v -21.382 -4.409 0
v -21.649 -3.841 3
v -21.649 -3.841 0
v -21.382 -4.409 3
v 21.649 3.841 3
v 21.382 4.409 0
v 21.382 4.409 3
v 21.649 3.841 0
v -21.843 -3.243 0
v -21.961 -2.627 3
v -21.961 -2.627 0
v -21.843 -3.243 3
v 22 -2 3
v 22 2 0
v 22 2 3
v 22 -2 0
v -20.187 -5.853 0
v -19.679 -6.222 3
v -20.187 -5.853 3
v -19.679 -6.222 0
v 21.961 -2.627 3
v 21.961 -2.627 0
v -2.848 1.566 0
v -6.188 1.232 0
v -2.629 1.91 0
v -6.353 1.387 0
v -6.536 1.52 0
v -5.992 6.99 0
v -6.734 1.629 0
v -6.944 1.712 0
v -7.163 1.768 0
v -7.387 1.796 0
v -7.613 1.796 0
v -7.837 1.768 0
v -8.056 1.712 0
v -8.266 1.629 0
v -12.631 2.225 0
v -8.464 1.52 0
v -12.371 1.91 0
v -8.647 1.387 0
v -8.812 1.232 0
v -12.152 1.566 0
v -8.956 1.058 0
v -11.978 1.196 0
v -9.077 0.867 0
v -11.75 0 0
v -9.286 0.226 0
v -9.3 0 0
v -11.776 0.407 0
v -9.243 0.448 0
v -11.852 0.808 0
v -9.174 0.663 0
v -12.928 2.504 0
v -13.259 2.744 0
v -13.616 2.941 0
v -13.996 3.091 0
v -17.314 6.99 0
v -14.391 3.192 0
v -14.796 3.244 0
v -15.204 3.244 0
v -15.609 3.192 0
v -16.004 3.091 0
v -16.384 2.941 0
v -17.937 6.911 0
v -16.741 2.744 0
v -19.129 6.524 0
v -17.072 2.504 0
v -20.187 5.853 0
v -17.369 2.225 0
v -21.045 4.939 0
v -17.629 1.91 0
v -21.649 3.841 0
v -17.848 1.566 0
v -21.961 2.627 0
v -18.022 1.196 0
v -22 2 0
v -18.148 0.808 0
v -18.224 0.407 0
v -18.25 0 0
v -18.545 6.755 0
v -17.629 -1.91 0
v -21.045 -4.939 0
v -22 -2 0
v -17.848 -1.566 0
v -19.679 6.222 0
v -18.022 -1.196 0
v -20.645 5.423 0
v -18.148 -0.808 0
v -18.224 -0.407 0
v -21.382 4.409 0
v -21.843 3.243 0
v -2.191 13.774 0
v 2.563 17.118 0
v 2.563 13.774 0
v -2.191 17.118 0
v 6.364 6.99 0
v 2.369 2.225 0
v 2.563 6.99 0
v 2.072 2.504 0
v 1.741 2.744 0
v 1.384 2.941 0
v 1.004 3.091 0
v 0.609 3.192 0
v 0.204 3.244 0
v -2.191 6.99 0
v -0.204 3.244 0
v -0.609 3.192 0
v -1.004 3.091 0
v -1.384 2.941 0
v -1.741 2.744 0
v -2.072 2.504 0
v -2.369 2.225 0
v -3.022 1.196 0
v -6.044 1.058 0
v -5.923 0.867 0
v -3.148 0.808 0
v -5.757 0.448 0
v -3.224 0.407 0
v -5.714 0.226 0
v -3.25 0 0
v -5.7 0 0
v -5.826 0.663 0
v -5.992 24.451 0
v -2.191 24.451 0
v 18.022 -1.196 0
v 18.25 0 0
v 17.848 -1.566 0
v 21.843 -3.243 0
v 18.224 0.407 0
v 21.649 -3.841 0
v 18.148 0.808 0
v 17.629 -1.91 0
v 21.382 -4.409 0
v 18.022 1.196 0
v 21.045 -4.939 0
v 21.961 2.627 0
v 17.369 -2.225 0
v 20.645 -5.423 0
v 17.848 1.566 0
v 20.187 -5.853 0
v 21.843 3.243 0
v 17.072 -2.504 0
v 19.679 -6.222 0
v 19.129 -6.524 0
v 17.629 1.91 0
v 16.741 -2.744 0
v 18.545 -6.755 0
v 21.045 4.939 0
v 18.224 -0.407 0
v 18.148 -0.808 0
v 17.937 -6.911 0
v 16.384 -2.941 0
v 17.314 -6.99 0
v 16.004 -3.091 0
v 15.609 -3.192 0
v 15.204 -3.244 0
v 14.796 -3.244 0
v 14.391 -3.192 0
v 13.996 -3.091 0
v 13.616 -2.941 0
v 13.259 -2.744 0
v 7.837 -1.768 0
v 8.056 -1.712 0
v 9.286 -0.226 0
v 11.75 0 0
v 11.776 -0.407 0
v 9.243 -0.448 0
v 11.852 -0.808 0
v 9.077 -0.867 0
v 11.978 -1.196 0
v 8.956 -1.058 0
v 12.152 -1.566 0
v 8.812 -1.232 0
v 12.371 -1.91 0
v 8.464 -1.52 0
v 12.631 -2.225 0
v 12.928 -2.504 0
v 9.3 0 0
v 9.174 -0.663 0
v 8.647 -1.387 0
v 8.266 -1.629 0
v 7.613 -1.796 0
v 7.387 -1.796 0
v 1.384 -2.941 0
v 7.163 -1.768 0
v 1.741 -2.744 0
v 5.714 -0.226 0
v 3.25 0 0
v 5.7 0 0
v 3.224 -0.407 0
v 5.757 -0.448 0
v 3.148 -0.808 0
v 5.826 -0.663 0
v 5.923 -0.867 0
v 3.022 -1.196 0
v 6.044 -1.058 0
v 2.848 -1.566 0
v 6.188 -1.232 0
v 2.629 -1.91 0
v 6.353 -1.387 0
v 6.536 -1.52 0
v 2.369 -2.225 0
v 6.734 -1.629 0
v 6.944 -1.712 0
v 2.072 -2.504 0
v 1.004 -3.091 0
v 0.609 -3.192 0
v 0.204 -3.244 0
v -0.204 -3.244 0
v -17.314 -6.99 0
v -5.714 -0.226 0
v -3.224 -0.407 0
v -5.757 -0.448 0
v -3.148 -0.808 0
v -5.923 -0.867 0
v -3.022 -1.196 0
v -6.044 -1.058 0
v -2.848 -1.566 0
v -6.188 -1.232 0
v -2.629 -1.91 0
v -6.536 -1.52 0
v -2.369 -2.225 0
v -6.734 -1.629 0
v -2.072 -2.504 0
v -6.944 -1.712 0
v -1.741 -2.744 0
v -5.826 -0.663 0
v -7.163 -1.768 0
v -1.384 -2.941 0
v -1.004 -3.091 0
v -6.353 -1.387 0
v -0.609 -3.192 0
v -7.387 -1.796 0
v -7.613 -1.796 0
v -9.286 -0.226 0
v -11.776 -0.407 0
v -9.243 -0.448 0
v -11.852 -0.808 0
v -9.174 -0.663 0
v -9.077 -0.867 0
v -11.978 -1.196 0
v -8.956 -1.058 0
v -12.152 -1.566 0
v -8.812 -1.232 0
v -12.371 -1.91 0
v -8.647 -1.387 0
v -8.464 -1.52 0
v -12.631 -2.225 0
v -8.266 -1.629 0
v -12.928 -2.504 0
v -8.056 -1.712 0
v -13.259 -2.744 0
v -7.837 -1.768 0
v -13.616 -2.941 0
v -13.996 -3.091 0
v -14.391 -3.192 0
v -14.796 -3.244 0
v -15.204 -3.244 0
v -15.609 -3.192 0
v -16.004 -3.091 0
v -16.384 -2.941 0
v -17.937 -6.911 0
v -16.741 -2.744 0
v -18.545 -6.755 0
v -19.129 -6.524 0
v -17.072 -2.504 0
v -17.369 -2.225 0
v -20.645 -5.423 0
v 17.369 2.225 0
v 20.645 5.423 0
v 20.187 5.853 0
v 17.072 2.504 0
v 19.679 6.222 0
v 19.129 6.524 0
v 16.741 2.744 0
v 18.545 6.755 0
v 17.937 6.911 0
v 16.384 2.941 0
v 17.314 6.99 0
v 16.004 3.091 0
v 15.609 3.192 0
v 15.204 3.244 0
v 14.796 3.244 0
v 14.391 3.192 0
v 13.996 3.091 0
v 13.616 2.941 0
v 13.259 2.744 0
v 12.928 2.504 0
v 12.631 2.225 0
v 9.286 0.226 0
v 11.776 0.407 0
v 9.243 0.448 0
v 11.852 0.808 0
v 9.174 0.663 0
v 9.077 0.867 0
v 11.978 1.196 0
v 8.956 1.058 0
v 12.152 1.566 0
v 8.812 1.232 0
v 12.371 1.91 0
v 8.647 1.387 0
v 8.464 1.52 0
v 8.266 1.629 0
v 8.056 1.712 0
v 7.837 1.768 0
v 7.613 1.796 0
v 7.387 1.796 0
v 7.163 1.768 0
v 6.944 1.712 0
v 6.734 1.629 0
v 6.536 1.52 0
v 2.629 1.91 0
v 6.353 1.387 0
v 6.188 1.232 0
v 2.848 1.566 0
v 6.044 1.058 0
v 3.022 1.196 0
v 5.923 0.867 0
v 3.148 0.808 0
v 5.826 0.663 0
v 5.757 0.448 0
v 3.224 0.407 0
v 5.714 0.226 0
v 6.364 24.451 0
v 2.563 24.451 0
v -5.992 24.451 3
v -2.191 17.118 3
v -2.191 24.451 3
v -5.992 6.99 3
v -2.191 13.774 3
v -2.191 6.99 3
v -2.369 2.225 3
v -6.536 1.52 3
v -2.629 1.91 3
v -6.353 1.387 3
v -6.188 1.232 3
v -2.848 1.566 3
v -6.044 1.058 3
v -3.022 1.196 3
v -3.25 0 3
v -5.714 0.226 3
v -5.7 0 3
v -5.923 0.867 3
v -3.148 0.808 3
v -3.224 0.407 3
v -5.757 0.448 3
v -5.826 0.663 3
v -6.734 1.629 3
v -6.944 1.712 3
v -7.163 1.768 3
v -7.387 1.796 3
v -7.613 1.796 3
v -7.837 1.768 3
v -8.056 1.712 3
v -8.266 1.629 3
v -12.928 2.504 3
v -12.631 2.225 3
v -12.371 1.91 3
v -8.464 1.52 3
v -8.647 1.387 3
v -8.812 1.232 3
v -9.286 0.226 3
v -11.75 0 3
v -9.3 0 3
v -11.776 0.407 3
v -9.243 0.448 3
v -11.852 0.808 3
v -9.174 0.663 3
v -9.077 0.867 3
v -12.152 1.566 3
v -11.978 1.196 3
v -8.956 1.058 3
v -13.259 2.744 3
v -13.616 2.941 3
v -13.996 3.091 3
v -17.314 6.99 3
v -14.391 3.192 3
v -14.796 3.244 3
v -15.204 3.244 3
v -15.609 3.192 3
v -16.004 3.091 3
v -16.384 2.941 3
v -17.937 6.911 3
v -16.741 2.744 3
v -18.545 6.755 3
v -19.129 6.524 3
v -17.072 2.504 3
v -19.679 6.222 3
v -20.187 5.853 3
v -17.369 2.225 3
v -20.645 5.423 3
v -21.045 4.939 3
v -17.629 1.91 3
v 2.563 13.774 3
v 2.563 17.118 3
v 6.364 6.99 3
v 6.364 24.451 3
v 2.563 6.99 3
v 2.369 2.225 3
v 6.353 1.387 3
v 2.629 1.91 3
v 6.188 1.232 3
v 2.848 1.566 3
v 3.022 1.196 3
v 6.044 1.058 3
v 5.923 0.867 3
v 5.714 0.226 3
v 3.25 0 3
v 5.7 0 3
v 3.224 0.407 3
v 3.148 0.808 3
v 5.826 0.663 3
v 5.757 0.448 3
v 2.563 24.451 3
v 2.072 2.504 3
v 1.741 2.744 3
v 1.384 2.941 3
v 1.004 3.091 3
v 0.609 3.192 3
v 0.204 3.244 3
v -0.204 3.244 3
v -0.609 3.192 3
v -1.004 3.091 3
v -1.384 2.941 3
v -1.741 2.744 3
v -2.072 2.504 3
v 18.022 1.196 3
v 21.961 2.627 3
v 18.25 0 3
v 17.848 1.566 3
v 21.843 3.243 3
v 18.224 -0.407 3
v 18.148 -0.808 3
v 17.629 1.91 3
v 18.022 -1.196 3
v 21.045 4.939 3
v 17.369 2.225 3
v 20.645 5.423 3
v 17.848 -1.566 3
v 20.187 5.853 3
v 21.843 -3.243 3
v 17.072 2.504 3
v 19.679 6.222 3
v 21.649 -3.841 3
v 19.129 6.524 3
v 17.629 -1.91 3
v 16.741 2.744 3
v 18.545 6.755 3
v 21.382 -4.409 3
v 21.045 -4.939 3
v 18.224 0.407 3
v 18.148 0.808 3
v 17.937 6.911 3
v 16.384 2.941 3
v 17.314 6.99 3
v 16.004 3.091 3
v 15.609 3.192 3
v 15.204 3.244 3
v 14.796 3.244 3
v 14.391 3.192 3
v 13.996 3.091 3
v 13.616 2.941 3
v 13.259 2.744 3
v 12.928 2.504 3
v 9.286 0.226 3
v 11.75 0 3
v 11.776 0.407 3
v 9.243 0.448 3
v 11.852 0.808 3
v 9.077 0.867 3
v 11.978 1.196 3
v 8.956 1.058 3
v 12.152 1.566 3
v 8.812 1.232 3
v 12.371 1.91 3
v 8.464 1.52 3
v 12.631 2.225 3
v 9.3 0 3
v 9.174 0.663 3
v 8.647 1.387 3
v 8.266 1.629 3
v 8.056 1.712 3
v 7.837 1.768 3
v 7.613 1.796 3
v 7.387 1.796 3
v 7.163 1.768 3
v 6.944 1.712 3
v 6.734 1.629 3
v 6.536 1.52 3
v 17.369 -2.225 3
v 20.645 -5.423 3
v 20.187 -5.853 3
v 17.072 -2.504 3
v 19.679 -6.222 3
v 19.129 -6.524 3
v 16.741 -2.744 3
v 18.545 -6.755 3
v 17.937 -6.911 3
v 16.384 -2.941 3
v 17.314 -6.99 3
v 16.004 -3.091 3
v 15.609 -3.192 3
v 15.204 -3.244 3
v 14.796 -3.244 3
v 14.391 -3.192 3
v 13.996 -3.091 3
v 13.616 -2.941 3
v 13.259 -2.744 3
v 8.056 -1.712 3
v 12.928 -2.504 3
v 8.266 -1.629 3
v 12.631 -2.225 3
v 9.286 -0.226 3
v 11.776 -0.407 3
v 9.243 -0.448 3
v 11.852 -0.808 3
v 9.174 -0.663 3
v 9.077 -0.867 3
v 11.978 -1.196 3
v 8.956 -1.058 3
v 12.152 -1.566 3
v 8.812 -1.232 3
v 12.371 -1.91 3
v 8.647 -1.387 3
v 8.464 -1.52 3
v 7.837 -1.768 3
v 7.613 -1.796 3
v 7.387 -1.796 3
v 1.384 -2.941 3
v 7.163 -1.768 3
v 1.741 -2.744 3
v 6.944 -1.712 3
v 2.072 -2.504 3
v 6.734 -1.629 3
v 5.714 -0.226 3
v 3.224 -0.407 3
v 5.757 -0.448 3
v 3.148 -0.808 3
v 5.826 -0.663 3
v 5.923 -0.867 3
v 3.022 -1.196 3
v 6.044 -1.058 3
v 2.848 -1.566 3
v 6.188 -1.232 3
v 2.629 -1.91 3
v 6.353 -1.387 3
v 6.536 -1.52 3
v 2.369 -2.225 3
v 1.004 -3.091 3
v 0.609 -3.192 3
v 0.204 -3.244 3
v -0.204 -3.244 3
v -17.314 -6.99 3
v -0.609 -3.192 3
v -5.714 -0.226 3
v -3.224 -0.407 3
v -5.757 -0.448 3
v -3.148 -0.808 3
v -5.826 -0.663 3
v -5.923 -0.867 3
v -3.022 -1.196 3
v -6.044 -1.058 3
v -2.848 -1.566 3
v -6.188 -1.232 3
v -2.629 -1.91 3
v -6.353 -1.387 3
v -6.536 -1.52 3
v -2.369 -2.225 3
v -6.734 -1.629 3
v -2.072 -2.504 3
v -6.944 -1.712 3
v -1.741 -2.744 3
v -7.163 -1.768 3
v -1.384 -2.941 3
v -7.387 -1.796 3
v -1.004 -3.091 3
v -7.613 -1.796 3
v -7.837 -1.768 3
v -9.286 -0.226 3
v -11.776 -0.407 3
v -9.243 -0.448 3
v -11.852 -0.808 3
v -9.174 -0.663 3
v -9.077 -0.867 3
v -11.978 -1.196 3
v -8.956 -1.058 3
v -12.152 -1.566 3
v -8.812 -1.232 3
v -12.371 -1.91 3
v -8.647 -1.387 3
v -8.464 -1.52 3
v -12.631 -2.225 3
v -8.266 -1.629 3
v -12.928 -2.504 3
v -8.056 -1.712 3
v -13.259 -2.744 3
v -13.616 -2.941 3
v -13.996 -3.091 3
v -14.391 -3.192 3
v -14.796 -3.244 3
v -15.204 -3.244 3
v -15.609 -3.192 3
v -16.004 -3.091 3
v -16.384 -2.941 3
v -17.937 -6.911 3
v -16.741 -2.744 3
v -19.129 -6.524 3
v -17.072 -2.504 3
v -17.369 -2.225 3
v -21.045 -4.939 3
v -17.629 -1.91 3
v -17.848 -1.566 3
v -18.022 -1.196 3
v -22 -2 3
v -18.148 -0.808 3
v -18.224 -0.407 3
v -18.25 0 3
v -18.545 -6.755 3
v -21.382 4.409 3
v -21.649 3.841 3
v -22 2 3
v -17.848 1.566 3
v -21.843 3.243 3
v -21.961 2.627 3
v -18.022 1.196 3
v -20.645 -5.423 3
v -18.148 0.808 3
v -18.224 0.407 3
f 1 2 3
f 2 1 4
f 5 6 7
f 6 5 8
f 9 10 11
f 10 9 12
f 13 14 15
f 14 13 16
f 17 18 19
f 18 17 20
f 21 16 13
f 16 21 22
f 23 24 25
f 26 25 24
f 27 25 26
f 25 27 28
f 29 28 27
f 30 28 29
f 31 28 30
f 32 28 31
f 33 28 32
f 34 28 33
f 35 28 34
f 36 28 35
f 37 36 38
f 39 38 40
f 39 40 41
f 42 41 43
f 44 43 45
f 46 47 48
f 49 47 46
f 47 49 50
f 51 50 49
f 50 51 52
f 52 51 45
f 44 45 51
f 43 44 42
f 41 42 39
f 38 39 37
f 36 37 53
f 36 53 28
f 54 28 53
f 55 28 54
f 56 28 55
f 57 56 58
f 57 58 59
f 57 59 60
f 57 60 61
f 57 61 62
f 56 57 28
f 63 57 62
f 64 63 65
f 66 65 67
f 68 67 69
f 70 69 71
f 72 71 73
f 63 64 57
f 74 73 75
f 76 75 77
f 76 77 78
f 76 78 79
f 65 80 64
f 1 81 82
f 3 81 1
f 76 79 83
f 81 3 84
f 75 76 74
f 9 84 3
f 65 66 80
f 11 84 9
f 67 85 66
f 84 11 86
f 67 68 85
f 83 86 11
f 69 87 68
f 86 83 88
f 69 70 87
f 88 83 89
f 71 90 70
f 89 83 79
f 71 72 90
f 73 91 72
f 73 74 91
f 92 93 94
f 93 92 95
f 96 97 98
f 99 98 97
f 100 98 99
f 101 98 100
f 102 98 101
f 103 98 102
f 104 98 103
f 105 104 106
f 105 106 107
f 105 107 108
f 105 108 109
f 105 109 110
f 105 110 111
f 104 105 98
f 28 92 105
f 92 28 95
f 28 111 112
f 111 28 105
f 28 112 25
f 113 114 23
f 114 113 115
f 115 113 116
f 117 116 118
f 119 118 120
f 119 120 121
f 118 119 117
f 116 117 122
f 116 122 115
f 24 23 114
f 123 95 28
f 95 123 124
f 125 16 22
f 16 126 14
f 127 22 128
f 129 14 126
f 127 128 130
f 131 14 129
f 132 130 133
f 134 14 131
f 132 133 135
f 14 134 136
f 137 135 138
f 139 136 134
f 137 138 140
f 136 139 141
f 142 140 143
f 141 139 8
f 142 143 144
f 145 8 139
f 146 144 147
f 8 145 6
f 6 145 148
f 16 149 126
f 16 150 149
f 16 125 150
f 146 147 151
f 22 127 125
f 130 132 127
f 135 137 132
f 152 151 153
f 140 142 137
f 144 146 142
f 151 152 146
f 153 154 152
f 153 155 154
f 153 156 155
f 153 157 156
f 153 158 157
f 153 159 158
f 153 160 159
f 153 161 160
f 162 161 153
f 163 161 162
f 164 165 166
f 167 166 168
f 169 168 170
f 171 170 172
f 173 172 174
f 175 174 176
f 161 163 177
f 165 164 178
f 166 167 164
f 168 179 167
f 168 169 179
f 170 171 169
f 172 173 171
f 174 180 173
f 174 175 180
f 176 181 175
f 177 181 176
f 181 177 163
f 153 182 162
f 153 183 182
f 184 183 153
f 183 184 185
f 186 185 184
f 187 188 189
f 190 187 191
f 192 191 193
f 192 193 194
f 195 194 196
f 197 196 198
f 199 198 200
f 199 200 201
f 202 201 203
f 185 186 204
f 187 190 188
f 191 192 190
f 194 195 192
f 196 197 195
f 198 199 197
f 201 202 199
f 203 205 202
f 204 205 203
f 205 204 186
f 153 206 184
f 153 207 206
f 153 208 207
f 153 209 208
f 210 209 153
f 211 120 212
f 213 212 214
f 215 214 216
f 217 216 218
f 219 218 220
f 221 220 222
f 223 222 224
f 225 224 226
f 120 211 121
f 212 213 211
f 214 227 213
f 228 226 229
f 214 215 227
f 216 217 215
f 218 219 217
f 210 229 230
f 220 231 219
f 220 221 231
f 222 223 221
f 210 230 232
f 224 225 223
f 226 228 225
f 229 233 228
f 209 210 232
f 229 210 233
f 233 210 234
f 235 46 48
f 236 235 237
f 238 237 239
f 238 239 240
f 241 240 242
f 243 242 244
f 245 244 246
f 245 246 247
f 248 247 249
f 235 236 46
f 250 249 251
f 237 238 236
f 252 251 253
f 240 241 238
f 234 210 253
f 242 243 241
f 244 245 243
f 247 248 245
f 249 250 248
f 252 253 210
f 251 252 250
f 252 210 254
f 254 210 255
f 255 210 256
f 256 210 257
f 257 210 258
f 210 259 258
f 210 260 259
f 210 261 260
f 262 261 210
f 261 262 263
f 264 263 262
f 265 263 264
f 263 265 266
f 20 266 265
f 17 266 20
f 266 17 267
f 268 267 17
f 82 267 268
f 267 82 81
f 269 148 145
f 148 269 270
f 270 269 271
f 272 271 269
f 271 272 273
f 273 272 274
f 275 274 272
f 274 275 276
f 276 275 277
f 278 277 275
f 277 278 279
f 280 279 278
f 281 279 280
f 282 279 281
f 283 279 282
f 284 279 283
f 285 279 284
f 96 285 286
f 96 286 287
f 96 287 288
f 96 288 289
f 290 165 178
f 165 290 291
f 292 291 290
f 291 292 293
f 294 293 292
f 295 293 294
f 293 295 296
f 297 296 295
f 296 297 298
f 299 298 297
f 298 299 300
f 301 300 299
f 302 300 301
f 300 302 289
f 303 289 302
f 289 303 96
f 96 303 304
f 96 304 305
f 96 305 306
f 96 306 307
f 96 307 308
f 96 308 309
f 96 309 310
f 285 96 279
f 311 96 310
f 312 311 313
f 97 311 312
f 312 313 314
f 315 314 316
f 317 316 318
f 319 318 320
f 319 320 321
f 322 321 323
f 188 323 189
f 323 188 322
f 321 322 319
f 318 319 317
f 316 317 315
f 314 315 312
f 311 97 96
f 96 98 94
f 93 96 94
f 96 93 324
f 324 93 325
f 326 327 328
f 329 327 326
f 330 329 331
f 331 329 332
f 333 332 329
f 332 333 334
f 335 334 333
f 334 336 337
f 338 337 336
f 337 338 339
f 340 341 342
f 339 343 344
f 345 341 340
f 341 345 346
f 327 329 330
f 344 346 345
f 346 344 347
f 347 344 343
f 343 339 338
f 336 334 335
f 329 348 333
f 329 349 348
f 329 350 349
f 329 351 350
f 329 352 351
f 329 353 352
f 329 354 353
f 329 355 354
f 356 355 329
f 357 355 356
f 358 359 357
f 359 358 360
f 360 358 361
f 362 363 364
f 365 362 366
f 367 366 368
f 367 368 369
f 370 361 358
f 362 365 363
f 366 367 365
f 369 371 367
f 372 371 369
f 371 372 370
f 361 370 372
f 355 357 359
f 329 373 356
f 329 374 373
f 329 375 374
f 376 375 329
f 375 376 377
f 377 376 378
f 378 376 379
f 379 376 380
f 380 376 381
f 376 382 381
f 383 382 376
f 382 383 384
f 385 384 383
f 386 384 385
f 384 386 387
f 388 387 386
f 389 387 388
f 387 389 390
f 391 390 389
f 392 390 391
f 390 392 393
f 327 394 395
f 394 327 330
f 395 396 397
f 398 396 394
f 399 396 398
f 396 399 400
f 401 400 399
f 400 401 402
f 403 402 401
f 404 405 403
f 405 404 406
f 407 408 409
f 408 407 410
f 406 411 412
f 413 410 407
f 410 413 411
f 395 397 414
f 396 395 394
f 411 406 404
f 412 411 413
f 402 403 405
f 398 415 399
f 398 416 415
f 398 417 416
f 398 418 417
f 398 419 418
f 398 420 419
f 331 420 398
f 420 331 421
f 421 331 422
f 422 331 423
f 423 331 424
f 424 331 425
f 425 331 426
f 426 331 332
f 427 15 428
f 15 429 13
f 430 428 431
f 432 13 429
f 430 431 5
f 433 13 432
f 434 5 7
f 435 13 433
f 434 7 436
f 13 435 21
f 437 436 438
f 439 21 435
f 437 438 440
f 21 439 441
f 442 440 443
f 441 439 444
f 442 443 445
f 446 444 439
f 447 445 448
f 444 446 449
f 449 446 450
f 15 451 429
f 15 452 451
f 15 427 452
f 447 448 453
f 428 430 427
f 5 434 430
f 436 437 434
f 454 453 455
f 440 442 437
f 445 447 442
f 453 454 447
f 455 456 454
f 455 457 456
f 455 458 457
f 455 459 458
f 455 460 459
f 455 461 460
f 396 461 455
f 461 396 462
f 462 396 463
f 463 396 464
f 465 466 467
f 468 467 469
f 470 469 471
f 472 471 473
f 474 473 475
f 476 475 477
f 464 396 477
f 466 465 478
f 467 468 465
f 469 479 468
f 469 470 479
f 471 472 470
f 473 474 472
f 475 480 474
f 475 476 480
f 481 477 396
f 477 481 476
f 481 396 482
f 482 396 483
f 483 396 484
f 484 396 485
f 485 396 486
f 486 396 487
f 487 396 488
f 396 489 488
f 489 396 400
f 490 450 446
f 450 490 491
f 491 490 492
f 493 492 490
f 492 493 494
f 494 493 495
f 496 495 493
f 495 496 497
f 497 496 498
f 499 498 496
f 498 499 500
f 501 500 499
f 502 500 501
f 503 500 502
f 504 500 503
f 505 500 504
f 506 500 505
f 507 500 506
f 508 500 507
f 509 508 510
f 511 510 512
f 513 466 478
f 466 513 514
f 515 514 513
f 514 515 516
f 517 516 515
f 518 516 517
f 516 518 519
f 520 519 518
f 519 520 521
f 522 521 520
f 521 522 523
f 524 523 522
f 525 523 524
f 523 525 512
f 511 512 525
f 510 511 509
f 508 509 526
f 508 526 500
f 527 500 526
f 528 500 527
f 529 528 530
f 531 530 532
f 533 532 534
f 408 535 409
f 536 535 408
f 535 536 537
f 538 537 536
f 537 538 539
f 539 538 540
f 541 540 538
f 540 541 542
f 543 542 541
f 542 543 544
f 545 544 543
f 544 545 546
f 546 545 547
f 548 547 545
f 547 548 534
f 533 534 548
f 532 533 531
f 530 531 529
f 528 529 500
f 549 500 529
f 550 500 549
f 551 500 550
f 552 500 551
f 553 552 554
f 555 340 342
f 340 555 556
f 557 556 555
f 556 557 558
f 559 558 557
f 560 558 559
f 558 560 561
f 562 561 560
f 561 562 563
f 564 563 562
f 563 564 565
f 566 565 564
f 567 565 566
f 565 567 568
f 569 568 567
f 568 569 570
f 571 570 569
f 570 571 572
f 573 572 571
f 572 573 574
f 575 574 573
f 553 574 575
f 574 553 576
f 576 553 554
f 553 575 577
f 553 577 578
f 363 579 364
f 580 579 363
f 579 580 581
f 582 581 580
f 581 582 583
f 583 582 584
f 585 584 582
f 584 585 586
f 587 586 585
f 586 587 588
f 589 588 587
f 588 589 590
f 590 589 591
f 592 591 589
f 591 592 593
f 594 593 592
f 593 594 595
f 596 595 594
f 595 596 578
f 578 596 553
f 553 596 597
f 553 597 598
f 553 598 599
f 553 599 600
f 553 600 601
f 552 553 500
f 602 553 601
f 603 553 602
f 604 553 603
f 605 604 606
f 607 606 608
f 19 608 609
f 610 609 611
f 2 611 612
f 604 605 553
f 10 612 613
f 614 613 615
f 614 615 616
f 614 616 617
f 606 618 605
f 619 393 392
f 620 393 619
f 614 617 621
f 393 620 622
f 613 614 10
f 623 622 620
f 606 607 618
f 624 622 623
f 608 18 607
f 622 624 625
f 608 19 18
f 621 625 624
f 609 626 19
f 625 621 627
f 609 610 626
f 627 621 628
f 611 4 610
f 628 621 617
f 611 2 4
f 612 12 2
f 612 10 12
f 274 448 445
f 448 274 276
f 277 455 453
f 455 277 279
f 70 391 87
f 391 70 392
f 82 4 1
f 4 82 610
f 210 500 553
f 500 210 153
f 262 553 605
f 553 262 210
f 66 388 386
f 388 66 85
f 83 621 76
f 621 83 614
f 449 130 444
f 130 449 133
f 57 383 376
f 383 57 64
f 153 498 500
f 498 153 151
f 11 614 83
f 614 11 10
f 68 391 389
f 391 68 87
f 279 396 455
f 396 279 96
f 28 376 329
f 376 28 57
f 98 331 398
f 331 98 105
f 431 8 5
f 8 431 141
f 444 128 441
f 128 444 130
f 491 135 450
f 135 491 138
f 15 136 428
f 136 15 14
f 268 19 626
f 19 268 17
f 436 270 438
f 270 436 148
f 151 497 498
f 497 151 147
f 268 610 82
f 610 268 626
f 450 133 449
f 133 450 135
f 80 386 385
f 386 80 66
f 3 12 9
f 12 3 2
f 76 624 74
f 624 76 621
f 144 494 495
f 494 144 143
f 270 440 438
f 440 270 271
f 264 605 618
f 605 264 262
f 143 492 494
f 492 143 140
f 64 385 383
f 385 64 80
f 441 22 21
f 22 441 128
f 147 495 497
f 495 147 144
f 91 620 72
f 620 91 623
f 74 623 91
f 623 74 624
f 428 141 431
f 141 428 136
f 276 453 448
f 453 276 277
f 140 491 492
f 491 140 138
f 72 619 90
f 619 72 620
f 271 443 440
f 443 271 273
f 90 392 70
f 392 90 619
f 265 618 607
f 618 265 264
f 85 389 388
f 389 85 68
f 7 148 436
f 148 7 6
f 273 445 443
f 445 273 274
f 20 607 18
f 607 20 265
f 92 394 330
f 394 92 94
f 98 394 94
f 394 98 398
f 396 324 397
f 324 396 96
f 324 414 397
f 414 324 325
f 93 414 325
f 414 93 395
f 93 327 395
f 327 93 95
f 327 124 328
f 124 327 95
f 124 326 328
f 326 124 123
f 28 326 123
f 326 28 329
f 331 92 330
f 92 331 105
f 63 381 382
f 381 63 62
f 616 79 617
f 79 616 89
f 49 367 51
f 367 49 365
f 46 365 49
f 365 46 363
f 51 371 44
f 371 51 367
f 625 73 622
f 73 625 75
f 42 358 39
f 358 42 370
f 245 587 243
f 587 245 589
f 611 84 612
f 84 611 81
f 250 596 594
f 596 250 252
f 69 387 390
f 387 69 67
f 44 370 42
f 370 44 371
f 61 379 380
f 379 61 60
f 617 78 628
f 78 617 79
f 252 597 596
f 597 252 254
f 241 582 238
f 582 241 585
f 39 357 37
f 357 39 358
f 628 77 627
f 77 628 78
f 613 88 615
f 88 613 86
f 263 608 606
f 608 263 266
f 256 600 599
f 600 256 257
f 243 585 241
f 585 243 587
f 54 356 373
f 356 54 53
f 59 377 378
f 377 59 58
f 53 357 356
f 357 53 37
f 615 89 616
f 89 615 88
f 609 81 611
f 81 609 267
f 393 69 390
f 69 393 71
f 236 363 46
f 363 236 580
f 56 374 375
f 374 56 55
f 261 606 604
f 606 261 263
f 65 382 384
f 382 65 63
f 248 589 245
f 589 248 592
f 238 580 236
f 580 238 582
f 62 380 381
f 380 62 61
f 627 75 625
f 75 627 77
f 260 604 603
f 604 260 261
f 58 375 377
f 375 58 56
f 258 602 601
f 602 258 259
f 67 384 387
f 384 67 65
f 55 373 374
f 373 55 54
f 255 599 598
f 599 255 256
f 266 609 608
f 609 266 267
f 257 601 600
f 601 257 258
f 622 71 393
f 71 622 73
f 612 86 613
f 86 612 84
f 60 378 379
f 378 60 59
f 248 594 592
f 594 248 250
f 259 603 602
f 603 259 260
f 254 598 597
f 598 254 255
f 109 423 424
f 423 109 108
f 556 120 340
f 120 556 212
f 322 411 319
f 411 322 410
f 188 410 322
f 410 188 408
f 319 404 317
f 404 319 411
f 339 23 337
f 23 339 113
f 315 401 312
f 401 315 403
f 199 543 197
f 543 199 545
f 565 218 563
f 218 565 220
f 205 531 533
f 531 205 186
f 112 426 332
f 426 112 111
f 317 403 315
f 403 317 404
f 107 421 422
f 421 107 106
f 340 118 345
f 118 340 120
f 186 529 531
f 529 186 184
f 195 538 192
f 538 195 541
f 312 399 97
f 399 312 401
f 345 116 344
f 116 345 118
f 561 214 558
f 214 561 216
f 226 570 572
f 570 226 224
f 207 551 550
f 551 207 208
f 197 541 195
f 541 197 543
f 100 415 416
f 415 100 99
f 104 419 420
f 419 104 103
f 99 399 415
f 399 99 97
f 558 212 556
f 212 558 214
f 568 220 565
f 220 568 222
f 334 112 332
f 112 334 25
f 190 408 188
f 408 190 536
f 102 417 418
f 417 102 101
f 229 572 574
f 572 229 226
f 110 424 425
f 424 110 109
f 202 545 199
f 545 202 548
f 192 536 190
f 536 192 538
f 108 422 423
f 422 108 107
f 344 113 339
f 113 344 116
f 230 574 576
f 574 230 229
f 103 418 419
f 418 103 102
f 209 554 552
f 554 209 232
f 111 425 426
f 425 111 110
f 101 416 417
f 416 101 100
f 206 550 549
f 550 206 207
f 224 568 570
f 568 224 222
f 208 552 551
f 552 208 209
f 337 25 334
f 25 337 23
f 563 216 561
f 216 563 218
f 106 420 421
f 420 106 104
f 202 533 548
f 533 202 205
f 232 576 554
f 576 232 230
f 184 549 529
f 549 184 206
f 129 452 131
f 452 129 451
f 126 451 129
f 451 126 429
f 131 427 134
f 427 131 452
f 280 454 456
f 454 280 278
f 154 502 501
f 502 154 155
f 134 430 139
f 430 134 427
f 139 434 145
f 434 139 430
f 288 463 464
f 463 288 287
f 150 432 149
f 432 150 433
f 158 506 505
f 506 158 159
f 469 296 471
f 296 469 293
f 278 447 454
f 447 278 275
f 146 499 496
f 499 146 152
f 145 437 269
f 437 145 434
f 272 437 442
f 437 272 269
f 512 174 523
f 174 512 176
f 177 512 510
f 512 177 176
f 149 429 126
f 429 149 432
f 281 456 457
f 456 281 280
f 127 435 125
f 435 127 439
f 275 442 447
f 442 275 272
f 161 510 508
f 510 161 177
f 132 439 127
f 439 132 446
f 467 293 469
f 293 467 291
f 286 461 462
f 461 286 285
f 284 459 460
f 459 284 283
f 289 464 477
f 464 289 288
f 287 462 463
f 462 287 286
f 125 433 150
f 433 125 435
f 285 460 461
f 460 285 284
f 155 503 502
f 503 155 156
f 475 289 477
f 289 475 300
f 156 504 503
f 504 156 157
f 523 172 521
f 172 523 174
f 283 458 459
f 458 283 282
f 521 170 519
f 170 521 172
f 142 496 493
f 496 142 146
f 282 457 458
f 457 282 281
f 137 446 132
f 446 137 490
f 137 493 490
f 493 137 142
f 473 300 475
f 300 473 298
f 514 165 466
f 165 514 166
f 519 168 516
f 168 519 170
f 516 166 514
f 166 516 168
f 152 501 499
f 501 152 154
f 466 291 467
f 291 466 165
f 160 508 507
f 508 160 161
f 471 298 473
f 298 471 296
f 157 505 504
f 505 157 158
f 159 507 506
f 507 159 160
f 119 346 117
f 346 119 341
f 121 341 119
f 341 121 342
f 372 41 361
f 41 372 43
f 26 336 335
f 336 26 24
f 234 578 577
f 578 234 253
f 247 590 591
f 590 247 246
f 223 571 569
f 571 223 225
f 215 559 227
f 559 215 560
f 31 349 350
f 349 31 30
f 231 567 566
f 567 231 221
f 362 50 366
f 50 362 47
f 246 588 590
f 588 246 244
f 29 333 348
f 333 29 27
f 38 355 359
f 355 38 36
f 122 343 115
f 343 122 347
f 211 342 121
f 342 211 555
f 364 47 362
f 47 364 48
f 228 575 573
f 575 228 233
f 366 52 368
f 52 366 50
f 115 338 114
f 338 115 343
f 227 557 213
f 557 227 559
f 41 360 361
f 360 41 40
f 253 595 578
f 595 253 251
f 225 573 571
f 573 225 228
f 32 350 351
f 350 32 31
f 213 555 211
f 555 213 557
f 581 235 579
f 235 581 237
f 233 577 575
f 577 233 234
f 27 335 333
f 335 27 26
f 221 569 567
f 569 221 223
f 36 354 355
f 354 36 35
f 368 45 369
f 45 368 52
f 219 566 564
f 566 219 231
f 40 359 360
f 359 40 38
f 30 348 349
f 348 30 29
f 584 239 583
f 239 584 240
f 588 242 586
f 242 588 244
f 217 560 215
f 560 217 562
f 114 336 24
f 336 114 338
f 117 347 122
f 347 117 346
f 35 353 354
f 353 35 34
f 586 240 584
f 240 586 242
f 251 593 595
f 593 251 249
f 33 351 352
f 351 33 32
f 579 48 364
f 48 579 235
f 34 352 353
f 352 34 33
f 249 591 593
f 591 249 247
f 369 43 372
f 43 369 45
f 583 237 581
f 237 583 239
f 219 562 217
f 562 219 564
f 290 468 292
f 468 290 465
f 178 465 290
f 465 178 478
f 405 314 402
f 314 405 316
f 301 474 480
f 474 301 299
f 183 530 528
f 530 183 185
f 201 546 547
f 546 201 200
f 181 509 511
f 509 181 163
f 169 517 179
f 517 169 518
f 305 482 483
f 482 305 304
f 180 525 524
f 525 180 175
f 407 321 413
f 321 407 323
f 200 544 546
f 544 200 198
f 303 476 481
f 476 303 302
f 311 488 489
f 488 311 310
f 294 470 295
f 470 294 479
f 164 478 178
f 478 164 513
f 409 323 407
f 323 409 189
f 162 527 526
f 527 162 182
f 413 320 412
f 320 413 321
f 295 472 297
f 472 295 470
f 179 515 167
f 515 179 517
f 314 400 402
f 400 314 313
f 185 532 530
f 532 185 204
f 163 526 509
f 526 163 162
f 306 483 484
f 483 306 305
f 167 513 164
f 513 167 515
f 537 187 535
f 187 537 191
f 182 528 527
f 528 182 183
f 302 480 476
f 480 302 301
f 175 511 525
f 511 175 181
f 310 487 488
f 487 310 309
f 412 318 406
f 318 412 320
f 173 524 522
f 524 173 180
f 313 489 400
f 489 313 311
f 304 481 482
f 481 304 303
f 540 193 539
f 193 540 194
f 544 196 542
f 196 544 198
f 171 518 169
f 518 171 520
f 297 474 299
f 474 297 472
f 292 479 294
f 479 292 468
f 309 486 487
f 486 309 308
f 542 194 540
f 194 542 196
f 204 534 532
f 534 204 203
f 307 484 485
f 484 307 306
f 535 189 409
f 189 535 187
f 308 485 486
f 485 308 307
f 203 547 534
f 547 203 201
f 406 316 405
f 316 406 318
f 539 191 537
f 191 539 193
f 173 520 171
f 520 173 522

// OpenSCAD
$fn = 50;


difference() {
	union() {
		hull() {
			translate(v = [-17.0000000000, 2.0000000000, 0]) {
				cylinder(h = 3, r = 5);
			}
			translate(v = [17.0000000000, 2.0000000000, 0]) {
				cylinder(h = 3, r = 5);
			}
			translate(v = [-17.0000000000, -2.0000000000, 0]) {
				cylinder(h = 3, r = 5);
			}
			translate(v = [17.0000000000, -2.0000000000, 0]) {
				cylinder(h = 3, r = 5);
			}
		}
		translate(v = [0, 24, 0]) {
			linear_extrude(height = 3) {
				text(font = "DejaVu Sans Mono:style=Bold", halign = "center", size = 19.0000000000, text = "H", valign = "top");
			}
		}
	}
	union() {
		translate(v = [-15.0000000000, 0.0000000000, 0]) {
			translate(v = [0, 0, -100]) {
				cylinder(h = 200, r = 3.2500000000);
			}
		}
		translate(v = [0, 0, -100]) {
			cylinder(h = 200, r = 3.2500000000);
		}
		translate(v = [15.0000000000, 0.0000000000, 0]) {
			translate(v = [0, 0, -100]) {
				cylinder(h = 200, r = 3.2500000000);
			}
		}
		translate(v = [-15.0000000000, 0.0000000000, 0]) {
			translate(v = [0, 0, -100]) {
				cylinder(h = 200, r = 1.8000000000);
			}
		}
		translate(v = [-7.5000000000, 0.0000000000, 0]) {
			translate(v = [0, 0, -100]) {
				cylinder(h = 200, r = 1.8000000000);
			}
		}
		translate(v = [0, 0, -100]) {
			cylinder(h = 200, r = 1.8000000000);
		}
		translate(v = [7.5000000000, 0.0000000000, 0]) {
			translate(v = [0, 0, -100]) {
				cylinder(h = 200, r = 1.8000000000);
			}
		}
		translate(v = [15.0000000000, 0.0000000000, 0]) {
			translate(v = [0, 0, -100]) {
				cylinder(h = 200, r = 1.8000000000);
			}
		}
	}
}
